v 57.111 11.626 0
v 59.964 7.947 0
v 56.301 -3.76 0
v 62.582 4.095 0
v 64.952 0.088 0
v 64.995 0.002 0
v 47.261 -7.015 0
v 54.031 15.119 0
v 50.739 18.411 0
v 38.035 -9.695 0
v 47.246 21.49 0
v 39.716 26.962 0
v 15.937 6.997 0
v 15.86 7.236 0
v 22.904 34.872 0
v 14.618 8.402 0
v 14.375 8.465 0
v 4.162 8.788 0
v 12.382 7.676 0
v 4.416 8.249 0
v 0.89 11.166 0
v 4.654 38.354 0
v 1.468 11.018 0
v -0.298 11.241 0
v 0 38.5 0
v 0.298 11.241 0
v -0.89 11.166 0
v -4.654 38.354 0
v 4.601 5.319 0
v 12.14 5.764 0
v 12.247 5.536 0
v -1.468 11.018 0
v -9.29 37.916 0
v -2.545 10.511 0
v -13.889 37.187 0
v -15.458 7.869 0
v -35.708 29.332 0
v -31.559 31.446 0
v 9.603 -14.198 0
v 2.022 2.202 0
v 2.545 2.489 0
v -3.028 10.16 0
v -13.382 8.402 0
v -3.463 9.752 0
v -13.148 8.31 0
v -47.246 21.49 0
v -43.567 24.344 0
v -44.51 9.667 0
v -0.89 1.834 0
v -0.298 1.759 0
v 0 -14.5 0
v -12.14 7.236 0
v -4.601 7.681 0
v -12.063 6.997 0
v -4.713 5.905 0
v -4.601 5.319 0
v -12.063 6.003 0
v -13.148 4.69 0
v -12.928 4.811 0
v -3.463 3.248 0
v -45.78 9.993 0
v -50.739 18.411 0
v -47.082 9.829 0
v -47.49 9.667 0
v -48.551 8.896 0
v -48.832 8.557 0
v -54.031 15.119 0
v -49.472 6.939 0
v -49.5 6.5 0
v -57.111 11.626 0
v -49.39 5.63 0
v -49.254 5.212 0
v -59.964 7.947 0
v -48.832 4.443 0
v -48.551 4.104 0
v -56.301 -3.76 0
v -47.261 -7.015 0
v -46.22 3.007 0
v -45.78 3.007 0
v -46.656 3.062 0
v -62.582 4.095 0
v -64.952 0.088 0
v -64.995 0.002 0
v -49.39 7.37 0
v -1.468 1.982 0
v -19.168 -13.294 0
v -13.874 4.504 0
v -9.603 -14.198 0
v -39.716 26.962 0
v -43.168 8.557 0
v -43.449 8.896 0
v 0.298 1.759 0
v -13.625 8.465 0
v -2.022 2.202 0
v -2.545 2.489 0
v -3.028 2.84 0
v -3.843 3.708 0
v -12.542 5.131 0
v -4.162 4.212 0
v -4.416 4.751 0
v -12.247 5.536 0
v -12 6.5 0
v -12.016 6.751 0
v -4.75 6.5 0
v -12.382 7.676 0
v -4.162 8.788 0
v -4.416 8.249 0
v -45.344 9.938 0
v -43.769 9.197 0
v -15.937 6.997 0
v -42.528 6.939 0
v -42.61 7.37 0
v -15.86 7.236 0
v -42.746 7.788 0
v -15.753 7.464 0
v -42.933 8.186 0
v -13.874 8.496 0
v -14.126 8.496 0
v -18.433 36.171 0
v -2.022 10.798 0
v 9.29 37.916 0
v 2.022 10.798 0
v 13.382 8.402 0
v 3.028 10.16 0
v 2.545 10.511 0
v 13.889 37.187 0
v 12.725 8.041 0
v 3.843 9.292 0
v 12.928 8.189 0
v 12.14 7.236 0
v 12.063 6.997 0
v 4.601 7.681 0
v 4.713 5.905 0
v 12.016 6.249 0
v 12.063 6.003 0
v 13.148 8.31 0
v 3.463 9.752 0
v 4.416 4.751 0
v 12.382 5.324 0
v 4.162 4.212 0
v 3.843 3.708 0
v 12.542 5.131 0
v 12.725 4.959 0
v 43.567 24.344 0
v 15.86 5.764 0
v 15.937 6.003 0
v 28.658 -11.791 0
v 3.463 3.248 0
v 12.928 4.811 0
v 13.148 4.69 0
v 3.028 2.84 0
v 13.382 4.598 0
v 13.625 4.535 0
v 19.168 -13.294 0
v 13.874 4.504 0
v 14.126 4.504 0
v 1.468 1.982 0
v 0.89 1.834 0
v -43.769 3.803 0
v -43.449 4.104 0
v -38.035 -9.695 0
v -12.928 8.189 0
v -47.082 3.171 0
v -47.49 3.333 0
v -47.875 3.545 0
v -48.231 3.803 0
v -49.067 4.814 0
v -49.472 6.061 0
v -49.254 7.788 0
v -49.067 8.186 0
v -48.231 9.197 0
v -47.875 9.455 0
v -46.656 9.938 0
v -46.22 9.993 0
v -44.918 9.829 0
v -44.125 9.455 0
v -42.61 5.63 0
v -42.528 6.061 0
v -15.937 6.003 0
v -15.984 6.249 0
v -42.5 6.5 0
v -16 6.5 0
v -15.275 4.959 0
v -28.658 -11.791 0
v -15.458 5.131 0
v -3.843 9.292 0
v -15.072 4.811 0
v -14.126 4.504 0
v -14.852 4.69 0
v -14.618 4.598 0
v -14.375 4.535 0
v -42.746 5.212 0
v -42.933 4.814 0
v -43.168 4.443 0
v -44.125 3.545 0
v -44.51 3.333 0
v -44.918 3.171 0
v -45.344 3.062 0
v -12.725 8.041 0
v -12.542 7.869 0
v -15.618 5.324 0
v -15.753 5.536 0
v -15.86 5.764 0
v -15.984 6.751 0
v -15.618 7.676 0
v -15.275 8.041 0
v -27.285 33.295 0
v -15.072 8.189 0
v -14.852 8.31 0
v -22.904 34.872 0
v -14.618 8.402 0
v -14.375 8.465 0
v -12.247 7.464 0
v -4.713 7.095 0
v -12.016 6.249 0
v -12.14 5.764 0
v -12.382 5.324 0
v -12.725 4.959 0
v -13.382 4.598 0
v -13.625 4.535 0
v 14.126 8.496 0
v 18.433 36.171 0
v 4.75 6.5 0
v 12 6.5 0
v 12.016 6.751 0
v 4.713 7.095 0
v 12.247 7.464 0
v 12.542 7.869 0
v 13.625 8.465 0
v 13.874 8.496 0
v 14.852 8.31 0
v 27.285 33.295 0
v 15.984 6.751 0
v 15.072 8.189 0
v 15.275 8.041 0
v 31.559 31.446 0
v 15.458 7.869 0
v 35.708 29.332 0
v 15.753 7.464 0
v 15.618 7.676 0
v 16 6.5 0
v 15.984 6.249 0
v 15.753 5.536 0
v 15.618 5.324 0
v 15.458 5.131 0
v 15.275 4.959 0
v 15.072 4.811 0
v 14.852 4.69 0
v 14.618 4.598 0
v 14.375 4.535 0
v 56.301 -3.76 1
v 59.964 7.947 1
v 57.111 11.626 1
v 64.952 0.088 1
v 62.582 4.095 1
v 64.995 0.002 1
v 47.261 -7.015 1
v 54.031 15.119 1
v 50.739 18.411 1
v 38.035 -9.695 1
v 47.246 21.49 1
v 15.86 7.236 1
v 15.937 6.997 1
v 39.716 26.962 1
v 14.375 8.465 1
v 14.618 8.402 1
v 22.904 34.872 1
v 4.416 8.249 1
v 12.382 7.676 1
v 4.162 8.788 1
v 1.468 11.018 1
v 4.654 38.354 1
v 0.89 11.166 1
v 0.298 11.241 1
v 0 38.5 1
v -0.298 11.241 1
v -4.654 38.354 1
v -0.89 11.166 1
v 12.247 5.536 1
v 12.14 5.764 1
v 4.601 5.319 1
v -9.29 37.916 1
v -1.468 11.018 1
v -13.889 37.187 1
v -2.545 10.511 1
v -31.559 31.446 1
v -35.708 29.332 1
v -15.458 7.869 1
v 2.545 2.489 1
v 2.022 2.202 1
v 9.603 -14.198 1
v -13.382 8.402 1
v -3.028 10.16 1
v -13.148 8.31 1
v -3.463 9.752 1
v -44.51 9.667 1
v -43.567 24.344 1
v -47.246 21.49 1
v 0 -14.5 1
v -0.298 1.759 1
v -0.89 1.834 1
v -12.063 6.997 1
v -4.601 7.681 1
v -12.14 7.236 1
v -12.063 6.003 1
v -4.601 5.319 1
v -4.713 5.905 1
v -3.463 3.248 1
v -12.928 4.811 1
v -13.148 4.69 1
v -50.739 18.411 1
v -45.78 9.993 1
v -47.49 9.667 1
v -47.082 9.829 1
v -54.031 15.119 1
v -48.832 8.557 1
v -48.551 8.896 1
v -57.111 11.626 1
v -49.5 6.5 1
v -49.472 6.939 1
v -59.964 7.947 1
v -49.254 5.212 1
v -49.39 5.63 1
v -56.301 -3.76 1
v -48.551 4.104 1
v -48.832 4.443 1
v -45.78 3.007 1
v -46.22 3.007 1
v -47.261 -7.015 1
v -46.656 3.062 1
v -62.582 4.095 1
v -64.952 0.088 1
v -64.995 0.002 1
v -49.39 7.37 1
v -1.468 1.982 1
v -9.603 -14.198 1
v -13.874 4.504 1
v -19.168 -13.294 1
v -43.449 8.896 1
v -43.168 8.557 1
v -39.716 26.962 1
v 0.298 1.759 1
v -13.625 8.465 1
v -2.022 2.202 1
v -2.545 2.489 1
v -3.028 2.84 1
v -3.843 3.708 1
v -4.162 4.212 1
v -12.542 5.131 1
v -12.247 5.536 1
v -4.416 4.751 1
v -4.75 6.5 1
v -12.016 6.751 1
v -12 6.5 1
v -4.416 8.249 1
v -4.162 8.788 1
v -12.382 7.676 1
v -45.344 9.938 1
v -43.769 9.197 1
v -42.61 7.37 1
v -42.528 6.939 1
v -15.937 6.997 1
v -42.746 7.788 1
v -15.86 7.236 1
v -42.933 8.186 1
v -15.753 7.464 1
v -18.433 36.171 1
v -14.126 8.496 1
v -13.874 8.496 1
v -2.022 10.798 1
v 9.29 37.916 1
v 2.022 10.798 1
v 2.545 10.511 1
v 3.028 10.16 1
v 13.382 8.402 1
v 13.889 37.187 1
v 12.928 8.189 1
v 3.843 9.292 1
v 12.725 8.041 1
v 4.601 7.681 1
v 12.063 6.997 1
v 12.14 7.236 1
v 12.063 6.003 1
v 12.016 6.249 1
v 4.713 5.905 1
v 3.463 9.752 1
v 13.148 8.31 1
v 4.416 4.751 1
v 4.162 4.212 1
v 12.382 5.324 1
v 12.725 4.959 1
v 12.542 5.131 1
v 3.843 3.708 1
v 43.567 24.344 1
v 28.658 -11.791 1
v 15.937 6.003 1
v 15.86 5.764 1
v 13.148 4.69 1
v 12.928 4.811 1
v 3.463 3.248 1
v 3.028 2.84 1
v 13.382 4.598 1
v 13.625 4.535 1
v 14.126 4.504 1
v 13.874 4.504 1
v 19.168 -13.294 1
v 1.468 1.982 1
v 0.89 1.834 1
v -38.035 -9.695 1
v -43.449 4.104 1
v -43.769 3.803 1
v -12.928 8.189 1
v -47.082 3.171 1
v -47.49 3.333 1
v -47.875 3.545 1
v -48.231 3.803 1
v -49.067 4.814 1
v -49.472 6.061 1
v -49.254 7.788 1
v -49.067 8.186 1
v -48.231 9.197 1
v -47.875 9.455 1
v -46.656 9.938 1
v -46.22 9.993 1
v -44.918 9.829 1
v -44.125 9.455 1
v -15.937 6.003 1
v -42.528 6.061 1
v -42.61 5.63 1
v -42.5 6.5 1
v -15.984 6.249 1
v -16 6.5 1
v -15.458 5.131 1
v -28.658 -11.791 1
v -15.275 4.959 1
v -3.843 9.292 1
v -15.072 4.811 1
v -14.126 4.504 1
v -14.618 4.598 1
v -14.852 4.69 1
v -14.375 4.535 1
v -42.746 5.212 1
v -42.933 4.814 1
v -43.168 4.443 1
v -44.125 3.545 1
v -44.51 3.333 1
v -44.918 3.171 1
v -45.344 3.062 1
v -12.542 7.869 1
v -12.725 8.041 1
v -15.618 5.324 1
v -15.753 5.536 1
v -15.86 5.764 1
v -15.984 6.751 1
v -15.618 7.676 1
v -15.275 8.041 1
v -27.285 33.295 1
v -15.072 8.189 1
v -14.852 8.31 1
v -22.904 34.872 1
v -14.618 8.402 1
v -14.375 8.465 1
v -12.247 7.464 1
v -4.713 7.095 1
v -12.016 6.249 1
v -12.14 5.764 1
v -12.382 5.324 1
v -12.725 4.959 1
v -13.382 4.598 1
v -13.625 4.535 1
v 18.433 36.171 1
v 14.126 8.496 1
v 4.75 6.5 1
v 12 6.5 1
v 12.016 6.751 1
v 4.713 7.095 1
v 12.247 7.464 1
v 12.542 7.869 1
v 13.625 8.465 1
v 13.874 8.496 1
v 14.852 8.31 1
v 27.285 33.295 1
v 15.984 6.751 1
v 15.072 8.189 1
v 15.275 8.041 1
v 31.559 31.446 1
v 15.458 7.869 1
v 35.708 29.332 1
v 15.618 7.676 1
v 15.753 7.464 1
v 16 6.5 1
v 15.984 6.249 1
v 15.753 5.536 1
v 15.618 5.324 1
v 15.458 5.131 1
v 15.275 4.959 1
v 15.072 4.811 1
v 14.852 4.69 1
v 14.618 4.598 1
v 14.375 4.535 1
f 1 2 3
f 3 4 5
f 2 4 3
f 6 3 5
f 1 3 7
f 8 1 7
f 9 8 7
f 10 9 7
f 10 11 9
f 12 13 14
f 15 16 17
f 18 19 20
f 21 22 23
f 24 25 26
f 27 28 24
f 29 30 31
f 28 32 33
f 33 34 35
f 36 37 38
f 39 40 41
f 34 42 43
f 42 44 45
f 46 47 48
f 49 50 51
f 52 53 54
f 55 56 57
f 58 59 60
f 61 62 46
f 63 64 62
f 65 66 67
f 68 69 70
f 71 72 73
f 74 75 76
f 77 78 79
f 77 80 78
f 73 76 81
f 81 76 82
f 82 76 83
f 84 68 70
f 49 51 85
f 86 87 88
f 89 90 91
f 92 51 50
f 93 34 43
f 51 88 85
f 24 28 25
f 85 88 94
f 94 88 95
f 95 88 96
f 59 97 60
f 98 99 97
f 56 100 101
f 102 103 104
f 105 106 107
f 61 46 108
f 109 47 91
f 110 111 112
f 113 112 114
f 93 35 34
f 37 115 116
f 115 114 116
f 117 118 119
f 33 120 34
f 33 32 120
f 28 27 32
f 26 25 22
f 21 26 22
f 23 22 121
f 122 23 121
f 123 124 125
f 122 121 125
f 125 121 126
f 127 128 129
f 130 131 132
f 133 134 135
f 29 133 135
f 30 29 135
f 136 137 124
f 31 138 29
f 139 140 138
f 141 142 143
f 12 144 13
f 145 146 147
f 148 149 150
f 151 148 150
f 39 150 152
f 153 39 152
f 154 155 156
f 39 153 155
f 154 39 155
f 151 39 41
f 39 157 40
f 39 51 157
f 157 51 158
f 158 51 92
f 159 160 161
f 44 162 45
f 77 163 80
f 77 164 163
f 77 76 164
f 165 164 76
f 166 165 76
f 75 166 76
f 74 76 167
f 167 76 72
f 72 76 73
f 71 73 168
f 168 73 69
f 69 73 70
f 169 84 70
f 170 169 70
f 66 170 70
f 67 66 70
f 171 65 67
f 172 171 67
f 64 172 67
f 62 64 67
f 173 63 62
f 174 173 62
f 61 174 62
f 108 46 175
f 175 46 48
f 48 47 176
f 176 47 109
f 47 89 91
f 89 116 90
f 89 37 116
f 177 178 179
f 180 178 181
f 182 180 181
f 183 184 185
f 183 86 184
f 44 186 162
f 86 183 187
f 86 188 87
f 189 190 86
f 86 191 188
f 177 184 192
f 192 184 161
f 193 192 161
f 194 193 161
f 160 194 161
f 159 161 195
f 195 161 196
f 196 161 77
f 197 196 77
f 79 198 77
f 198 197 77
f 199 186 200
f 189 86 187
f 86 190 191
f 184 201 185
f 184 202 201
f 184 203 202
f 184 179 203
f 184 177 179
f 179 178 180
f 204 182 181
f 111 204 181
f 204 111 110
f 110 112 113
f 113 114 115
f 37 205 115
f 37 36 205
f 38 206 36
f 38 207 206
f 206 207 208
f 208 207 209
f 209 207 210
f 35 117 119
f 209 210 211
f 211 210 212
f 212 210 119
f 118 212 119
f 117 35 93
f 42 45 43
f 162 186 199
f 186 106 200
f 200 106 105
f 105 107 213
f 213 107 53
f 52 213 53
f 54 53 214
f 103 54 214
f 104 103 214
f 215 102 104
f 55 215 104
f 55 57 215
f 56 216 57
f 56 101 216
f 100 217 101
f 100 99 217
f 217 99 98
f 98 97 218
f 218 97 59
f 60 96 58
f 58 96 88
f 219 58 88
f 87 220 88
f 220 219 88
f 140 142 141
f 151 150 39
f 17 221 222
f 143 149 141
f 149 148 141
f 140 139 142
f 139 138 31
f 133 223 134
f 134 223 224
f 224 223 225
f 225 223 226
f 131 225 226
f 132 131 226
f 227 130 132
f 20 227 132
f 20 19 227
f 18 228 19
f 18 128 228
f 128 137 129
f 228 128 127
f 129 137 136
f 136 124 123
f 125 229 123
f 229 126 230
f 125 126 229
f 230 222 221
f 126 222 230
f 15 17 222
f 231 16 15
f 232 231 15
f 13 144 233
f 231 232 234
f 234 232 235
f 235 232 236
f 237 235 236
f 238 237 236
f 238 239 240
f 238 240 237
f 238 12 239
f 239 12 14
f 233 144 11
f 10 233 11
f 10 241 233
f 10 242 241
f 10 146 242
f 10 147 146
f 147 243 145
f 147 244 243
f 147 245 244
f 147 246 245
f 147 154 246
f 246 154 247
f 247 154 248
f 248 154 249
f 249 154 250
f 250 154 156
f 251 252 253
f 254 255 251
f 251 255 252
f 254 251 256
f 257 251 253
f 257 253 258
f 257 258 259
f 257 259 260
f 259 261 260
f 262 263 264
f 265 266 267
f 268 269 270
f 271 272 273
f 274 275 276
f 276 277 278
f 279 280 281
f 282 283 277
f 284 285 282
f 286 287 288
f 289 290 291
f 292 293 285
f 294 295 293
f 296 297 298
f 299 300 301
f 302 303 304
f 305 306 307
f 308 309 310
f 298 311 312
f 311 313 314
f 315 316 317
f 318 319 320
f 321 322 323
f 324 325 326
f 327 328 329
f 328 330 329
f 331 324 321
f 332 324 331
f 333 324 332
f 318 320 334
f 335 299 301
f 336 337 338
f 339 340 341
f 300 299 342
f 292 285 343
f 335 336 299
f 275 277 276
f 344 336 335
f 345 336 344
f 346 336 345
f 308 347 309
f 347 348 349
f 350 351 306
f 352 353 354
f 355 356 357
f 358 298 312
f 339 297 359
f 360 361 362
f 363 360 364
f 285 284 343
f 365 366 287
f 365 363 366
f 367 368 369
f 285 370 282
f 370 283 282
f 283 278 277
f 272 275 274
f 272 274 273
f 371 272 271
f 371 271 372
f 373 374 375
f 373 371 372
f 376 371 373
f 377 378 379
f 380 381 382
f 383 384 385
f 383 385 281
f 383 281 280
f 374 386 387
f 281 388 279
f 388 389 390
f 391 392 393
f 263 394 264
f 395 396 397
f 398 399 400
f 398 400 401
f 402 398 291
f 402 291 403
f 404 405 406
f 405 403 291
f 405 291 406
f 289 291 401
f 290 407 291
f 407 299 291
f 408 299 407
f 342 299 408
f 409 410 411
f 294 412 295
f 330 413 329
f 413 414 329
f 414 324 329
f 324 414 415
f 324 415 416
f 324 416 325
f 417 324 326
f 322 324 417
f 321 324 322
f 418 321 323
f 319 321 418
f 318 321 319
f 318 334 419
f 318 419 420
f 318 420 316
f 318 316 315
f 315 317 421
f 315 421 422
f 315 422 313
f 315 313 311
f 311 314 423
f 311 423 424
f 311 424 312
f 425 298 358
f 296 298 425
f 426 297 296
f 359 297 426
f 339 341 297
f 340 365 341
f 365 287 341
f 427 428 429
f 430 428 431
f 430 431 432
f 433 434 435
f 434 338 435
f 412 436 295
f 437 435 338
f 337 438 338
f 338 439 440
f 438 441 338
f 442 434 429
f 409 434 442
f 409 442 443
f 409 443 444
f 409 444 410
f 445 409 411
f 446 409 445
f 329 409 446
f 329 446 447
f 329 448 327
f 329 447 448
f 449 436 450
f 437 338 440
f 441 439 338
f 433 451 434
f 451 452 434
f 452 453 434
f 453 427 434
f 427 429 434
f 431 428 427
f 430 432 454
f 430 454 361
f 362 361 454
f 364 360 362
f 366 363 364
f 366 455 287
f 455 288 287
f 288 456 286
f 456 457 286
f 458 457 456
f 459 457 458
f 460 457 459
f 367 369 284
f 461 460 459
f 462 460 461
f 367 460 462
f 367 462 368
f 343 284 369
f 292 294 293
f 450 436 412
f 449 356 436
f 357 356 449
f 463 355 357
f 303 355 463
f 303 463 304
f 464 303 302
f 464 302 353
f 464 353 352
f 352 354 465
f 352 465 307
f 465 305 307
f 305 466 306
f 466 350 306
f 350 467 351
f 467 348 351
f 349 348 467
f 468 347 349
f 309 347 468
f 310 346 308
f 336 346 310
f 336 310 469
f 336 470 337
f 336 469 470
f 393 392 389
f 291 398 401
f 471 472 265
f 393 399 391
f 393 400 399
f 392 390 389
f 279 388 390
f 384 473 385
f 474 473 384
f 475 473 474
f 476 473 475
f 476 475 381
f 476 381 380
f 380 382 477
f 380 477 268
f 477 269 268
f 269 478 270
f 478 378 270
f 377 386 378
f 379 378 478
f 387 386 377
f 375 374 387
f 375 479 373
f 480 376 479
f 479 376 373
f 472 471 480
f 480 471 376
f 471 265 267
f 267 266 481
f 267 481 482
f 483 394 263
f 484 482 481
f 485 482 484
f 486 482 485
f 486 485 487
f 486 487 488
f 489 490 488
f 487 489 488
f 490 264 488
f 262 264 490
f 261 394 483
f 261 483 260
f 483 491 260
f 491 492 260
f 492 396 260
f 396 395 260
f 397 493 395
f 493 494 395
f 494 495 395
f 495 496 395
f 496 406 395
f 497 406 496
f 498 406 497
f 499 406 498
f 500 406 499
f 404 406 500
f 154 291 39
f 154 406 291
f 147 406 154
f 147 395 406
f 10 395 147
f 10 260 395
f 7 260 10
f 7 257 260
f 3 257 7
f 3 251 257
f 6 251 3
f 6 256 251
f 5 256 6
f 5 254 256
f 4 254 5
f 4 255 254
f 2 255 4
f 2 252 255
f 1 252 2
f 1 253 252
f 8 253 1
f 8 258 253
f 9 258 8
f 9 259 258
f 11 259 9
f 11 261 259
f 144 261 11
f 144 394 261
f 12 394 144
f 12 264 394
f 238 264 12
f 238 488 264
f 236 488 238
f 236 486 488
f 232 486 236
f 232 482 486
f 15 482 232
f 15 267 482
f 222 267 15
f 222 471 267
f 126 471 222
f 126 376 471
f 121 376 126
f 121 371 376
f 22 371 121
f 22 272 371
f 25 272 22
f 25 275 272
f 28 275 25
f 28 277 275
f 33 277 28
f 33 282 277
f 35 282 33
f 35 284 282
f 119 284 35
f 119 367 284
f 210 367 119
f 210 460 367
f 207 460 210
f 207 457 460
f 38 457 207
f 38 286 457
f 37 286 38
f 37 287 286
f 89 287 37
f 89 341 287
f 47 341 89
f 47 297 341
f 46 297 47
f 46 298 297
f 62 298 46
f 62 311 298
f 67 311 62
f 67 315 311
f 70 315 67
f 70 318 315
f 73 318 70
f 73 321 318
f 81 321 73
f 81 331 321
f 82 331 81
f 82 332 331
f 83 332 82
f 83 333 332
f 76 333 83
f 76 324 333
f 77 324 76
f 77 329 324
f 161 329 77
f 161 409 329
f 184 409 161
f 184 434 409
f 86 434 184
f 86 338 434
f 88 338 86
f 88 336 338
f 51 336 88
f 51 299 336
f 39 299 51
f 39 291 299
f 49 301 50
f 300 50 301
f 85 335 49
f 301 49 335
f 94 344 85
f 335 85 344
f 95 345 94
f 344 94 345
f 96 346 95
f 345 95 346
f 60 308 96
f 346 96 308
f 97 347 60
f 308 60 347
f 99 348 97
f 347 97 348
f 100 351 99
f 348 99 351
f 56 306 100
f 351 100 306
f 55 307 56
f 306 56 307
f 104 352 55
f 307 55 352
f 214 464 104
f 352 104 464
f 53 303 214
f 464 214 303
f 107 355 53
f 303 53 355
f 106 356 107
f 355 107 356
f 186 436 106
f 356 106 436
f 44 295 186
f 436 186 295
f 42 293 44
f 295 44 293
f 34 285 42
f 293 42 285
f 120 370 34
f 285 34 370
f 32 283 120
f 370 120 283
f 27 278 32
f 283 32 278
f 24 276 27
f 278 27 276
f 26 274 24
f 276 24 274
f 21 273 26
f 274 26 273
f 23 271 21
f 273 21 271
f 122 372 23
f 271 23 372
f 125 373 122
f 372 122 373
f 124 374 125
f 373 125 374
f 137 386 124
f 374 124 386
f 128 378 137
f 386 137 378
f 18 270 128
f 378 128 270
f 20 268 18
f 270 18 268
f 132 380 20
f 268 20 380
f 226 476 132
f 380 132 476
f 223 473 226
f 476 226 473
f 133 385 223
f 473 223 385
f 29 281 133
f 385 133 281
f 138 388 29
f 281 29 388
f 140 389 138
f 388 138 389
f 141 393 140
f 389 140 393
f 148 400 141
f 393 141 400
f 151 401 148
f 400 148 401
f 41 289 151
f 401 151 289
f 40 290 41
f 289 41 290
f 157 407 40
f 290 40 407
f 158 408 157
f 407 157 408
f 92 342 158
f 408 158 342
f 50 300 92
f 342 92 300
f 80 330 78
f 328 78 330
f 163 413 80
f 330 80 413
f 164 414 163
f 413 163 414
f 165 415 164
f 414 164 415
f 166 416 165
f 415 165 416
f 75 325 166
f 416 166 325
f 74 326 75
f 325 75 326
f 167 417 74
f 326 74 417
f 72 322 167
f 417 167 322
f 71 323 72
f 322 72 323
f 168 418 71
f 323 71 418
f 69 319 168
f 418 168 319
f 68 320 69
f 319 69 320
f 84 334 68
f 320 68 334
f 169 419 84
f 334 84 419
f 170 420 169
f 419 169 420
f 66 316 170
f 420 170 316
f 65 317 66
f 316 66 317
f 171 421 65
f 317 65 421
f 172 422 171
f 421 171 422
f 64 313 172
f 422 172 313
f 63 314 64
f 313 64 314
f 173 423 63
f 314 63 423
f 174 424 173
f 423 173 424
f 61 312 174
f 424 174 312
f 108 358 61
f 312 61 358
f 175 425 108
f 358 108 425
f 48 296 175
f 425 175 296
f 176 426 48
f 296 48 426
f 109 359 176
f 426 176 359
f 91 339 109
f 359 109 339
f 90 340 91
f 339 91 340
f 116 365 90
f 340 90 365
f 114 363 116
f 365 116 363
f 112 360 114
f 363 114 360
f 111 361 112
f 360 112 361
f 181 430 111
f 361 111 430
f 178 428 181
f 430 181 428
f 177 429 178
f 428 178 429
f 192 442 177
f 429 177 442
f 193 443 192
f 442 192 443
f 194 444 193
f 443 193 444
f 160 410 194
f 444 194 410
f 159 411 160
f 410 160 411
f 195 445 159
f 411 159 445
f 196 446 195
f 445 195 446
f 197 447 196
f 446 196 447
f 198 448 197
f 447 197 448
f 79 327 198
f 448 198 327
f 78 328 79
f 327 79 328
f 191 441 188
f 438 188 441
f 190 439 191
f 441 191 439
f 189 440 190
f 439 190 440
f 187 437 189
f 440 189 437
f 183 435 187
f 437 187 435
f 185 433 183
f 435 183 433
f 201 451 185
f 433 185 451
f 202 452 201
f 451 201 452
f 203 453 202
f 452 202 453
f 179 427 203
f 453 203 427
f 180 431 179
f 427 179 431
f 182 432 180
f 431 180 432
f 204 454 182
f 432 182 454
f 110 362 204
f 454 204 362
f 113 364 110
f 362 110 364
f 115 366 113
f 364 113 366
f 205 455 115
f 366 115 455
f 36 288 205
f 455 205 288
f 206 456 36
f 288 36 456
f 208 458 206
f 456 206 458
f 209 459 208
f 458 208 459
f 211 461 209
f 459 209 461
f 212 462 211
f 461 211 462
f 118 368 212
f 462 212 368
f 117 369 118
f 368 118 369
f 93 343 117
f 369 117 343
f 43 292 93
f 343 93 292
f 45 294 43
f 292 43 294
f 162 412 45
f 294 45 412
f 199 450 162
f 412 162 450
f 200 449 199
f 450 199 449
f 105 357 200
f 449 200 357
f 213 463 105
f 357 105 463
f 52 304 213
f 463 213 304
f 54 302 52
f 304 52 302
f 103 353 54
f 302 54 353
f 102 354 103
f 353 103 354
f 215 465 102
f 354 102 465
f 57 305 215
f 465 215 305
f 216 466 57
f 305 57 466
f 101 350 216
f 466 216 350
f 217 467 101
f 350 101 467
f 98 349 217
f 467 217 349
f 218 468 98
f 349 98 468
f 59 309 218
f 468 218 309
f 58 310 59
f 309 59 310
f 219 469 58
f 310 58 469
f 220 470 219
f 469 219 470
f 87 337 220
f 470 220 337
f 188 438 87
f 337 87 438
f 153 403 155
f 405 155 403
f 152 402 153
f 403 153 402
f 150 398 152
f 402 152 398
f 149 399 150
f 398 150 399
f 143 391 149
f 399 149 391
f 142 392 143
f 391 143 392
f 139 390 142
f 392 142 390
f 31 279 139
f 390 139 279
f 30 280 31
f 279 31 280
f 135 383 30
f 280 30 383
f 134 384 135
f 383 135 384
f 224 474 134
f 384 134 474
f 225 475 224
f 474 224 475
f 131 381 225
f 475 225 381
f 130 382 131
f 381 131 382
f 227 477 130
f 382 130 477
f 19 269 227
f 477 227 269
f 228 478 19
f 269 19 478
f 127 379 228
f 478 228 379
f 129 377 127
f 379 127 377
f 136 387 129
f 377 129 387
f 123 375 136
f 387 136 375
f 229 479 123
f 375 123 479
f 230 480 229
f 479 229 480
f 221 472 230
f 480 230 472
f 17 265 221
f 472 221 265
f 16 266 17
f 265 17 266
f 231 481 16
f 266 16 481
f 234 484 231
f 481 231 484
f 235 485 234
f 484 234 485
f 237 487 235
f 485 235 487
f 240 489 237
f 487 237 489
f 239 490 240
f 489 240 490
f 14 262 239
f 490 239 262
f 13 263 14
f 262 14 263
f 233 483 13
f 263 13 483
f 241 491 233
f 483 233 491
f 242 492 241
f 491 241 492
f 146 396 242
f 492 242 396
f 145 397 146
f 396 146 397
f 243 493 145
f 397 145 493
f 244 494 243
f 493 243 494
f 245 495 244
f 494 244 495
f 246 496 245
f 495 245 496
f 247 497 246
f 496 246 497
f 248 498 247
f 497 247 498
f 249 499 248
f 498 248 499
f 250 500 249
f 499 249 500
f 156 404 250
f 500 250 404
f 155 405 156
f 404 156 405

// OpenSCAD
width_y = 130;
upper_half_x = 38.5;
lower_half_x = 53 - upper_half_x;

function plate_half_r(x, y) = (pow(x, 2) + pow(y, 2)) / (2 * x);
upper_half_r = plate_half_r(upper_half_x, width_y / 2);
lower_half_r = plate_half_r(lower_half_x, width_y / 2);
echo(upper_half_r = upper_half_r, lower_half_r = lower_half_r);
upper_half_a = upper_half_x - upper_half_r;
lower_half_a = lower_half_r - lower_half_x;
echo(upper_half_a = upper_half_a, lower_half_a = lower_half_a);

light_hole_d = 7;
light_hole_x = 10 - light_hole_d / 2;
light_hole_y = 49.5 - light_hole_d / 2;
knob_hole_inner_d = 6;
knob_hole_outer_d = 9.5;
knob_hole_x = 9.5 - knob_hole_inner_d / 2;
screw_hole_inner_d = 4;
screw_hole_outer_d = 7;
screw_hole_x = knob_hole_x;
screw_hole_y = 20.5 - screw_hole_outer_d / 2 - knob_hole_inner_d / 2;

module plate() {
  difference() {
    intersection() {
      translate([0, upper_half_a]) {
        circle(r = upper_half_r, $fn = 100);
      }
      translate([0, lower_half_a]) {
        circle(r = lower_half_r, $fn = 100);
      }
    }
    translate([-light_hole_y, light_hole_x]) {
      circle(d = light_hole_d, $fn = 50);
    }
    translate([0, knob_hole_x]) {
      circle(d = knob_hole_outer_d, $fn = 50);
    }
    for(i = [-1, 1]) {
      translate([i * screw_hole_y, screw_hole_x]) {
        circle(d = screw_hole_inner_d, $fn = 50);
      }
    }
  }
}

linear_extrude(1) plate();
